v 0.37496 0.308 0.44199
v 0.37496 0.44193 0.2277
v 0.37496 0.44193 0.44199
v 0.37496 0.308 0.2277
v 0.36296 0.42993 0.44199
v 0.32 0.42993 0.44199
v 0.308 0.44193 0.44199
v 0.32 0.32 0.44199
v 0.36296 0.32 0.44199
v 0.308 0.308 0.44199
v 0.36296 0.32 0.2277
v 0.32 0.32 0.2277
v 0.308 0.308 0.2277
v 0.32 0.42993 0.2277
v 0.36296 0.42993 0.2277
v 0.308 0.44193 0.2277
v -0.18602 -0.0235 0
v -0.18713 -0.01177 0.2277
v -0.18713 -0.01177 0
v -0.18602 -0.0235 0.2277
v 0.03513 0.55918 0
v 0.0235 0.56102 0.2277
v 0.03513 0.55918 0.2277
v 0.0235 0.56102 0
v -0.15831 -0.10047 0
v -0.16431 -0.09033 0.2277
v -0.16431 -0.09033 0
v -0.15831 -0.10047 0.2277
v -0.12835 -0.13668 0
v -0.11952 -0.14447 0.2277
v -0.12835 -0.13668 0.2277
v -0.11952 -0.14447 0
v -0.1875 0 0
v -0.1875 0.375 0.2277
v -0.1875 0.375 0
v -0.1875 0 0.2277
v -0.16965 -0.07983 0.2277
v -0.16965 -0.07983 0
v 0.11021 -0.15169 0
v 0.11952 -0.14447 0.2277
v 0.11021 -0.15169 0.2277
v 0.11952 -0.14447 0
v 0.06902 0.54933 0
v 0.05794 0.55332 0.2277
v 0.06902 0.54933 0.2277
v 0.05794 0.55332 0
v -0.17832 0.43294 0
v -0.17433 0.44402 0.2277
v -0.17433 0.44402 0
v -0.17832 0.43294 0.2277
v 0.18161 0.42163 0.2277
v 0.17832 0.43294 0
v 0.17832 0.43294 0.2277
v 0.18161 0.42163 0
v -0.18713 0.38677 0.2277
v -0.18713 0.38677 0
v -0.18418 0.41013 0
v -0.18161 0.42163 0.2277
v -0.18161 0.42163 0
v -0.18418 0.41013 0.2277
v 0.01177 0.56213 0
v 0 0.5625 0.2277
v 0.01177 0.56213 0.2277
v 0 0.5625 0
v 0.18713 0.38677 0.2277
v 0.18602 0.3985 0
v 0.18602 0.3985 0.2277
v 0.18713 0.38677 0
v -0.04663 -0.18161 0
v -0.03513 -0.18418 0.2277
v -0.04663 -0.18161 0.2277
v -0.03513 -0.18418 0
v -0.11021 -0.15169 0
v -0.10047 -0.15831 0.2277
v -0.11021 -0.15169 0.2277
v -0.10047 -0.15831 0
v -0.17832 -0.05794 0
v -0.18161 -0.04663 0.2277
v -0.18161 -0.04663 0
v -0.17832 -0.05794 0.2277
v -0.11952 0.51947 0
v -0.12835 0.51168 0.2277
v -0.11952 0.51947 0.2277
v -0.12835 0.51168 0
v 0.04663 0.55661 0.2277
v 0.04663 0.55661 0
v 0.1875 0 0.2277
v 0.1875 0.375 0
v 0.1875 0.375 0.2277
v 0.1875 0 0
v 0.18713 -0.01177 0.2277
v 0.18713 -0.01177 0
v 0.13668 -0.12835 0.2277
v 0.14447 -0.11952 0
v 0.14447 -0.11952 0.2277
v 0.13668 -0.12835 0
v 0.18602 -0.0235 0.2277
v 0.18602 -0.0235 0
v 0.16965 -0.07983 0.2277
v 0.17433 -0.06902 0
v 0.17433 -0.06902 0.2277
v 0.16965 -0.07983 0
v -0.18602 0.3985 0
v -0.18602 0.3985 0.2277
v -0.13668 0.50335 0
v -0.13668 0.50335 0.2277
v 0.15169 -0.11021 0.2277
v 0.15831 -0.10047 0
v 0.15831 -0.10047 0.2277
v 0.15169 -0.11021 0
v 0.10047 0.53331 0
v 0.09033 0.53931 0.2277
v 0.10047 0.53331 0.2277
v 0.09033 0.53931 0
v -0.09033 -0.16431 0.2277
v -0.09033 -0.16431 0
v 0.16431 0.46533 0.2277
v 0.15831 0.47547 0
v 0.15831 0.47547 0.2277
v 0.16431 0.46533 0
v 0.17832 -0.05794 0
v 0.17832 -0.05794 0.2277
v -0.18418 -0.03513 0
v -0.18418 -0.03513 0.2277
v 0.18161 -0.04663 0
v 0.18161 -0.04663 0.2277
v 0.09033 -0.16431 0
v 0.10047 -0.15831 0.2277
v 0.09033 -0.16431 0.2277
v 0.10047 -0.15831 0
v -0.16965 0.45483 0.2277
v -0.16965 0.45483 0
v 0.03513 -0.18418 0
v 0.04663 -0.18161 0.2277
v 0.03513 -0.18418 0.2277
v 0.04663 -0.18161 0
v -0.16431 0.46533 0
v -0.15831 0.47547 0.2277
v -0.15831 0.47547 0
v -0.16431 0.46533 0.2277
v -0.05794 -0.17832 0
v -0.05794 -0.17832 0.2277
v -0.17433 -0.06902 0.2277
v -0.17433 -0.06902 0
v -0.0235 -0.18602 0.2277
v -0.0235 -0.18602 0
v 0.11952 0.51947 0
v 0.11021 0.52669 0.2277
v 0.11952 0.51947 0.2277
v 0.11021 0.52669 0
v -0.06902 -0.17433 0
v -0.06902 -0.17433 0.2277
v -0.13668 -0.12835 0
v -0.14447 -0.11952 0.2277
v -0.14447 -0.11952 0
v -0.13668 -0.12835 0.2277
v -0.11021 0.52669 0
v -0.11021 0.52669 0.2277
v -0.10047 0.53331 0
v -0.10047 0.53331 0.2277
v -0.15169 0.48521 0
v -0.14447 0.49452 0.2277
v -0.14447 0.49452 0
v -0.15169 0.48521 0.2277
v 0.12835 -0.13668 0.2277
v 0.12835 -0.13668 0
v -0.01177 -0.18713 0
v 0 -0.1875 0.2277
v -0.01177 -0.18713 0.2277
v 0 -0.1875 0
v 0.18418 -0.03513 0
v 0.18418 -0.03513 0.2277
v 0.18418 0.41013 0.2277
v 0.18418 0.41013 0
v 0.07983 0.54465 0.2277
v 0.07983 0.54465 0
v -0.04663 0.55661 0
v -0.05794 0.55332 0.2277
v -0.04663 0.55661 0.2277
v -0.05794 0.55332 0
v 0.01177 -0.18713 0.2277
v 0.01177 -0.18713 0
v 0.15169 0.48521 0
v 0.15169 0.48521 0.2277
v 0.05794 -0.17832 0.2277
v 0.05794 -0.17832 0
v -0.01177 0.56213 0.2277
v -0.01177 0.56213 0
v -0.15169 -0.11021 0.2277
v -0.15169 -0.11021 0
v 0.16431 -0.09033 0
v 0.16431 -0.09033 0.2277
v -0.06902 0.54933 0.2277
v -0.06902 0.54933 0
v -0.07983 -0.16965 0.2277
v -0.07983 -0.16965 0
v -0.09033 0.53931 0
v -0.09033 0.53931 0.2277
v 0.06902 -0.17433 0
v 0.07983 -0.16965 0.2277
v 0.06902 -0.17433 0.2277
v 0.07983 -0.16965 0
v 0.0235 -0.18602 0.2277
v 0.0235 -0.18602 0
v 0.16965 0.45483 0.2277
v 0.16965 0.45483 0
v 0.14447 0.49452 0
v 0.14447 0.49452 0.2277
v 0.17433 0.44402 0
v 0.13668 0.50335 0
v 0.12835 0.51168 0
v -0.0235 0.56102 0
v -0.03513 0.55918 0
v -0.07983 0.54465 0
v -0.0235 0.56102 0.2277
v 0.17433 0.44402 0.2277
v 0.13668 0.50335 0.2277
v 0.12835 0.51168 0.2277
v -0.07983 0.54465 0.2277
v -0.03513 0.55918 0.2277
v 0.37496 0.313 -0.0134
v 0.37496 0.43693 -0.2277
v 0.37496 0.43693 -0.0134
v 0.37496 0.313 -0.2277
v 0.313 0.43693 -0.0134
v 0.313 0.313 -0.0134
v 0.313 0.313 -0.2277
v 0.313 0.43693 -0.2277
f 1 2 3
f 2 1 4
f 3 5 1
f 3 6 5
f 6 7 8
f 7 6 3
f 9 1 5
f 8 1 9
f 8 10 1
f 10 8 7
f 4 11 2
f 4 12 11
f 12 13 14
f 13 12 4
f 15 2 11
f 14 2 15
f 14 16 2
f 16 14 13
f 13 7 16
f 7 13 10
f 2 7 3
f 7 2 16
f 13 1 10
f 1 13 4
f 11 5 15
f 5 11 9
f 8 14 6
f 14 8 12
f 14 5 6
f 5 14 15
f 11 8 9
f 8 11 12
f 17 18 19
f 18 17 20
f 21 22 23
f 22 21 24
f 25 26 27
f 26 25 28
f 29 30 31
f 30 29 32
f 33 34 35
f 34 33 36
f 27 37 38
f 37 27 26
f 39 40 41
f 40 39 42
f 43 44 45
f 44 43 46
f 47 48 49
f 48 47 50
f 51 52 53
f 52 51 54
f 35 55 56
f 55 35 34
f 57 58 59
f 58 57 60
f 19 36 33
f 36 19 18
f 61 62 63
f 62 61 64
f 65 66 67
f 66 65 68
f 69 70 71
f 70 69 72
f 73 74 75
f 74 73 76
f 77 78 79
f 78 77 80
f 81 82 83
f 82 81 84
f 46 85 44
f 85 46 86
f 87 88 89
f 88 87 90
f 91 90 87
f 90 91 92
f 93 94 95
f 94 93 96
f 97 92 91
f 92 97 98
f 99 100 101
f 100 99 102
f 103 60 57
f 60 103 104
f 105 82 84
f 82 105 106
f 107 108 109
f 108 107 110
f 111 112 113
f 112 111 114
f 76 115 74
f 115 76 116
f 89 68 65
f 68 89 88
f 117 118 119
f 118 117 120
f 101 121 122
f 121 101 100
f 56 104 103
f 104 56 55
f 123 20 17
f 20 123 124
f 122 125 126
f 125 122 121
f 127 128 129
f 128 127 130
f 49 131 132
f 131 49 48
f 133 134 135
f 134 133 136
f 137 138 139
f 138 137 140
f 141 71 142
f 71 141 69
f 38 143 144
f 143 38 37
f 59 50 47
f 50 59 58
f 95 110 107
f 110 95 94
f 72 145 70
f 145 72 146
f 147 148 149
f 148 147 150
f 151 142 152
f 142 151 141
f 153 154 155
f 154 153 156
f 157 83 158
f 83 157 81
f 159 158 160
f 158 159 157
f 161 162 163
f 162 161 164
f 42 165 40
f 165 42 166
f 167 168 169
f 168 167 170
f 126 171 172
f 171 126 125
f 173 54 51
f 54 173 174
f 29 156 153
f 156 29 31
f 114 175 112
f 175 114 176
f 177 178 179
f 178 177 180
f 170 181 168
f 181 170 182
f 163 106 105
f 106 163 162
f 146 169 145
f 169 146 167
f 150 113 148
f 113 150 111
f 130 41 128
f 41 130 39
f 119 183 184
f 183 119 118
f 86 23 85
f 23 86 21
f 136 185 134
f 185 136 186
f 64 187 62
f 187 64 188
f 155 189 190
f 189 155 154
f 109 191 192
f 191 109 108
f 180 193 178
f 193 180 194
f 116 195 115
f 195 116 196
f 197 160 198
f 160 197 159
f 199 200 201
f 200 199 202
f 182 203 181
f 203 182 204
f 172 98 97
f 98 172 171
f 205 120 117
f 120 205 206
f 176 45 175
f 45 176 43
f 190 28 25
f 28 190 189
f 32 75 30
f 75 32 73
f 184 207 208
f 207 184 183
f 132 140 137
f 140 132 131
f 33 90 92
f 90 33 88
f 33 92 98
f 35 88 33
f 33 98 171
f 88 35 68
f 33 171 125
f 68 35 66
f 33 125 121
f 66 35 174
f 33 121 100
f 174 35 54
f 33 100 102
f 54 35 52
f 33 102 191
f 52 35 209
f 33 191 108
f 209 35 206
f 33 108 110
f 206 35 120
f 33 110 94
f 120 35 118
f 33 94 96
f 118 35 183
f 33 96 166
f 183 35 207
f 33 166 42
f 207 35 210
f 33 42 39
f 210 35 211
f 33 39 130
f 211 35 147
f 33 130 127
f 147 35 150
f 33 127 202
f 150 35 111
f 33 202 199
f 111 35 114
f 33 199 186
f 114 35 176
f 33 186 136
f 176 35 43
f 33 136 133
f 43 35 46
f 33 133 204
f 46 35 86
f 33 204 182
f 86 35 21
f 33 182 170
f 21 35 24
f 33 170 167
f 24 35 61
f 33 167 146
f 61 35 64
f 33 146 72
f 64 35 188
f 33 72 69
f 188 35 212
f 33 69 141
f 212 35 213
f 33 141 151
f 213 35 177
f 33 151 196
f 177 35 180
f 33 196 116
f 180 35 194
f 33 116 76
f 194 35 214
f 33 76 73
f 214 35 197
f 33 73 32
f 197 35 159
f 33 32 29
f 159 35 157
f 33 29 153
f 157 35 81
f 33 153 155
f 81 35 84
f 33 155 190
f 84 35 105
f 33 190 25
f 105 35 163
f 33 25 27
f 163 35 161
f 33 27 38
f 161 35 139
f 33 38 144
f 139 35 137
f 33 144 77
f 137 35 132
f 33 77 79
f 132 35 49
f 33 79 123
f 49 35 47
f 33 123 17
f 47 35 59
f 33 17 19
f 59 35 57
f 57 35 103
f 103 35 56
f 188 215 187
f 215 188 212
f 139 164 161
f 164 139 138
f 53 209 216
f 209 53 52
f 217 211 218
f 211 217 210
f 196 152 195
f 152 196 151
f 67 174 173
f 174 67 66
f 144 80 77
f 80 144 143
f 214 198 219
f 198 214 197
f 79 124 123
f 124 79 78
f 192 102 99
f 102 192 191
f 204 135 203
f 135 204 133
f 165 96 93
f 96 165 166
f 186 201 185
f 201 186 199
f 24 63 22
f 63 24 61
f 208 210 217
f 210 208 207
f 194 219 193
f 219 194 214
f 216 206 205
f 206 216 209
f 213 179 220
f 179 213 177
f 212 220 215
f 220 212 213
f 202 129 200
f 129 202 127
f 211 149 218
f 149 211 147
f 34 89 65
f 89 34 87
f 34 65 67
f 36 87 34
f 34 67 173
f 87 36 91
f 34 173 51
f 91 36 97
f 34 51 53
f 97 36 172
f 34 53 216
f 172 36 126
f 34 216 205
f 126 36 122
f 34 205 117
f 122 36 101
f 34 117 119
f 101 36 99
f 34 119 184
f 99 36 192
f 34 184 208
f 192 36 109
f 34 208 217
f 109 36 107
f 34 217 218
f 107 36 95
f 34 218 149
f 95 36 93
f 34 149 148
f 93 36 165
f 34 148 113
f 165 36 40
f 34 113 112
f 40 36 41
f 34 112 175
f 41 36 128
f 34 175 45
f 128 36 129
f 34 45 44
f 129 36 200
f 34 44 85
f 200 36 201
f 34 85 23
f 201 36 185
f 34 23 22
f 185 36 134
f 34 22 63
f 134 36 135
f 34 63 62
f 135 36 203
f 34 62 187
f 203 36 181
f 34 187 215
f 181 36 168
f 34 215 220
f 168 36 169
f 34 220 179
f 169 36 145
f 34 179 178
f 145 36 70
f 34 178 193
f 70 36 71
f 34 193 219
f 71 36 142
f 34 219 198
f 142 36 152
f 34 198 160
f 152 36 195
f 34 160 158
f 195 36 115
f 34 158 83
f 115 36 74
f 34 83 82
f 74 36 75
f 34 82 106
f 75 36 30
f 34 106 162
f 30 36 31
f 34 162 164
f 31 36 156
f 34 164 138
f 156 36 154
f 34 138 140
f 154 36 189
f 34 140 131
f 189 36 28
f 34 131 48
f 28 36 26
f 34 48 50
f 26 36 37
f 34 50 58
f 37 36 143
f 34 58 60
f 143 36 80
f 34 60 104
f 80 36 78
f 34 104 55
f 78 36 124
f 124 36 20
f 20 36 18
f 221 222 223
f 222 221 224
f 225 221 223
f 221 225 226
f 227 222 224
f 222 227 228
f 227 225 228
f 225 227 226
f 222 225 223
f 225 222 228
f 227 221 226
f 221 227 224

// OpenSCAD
// =============================================================================
// Parametric CAD Model - Base, Second Solid, Raised Sleeve, Lower Continuation & Cuts
// =============================================================================

// Global resolution
$fn = 100;

// --- Base & Main Footprint Parameters ---
base_len   = 0.375;
base_wid   = 0.75;
base_ht    = 0.013393;
second_reach = 0.2277;

// --- Raised Sleeve/Post Parameters ---
feat_len   = 0.066964;
feat_wid   = 0.133929;
feat_ht    = 0.214286;
feat_left  = 0.308;
feat_front = 0.308;

// --- Lower Continuation Parameters ---
lower_start_z = -0.2277;
lower_end_z   = -0.0134;
lower_ht      = 0.2143;
lower_inset   = 0.005; // Ensures containment within shallower footprint

// --- Circular Cut Parameters ---
cut_r      = 0.0067;
cut_x      = 0.3616;
cut_y1     = 0.6828;
cut_y2     = 0.0672;
cut_z_mid  = 0.1741; // (0.1674 + 0.1808) / 2
cut_ht     = 0.0134;

// =============================================================================
// Modules
// =============================================================================

// Pill-shaped footprint spanning exact len x wid with 0 edge offsets
module pill_footprint(l, w) {
    hull() {
        circle(r = l/2);
        translate([0, w - l, 0]) circle(r = l/2);
    }
}

// Raised sleeve with central slot/opening (inner loops remain open)
module raised_sleeve(l, w, h, wall = 0.012) {
    difference() {
        cube([l, w, h]);
        translate([wall, wall, -0.01])
            cube([l - 2*wall, w - 2*wall, h + 0.02]);
    }
}

// Lower continuation block sharing right edge, inset on other sides
module lower_continuation(l, w, h, inset) {
    // Positioned to share right edge, contained within parent footprint
    translate([inset, inset, 0])
        cube([l - inset, w - 2*inset, h]);
}

// =============================================================================
// Main Assembly
// =============================================================================
difference() {
    // Union of all positive solid volumes
    union() {
        // 1. Base solid (extruded from datum Z=0)
        translate([0, 0, 0])
            linear_extrude(height = base_ht, convexity = 10)
                pill_footprint(base_len, base_wid);

        // 2. Second upper solid (stacked on base, extends to 0.2277)
        translate([0, 0, base_ht])
            linear_extrude(height = second_reach - base_ht, convexity = 10)
                pill_footprint(base_len, base_wid);

        // 3. Raised sleeve/post feature (sits atop second solid)
        translate([feat_left, feat_front, second_reach])
            raised_sleeve(feat_len, feat_wid, feat_ht);

        // 4. Paired lower continuation (extends below base underside)
        translate([feat_left, feat_front, lower_start_z])
            lower_continuation(feat_len, feat_wid, lower_ht, lower_inset);
    }

    // --- Subtractive Features ---
    // Circular opening 1
    translate([cut_x, cut_y1, cut_z_mid])
        cylinder(r = cut_r, h = cut_ht + 0.002, center = true, $fn = 32);

    // Circular opening 2
    translate([cut_x, cut_y2, cut_z_mid])
        cylinder(r = cut_r, h = cut_ht + 0.002, center = true, $fn = 32);
}
